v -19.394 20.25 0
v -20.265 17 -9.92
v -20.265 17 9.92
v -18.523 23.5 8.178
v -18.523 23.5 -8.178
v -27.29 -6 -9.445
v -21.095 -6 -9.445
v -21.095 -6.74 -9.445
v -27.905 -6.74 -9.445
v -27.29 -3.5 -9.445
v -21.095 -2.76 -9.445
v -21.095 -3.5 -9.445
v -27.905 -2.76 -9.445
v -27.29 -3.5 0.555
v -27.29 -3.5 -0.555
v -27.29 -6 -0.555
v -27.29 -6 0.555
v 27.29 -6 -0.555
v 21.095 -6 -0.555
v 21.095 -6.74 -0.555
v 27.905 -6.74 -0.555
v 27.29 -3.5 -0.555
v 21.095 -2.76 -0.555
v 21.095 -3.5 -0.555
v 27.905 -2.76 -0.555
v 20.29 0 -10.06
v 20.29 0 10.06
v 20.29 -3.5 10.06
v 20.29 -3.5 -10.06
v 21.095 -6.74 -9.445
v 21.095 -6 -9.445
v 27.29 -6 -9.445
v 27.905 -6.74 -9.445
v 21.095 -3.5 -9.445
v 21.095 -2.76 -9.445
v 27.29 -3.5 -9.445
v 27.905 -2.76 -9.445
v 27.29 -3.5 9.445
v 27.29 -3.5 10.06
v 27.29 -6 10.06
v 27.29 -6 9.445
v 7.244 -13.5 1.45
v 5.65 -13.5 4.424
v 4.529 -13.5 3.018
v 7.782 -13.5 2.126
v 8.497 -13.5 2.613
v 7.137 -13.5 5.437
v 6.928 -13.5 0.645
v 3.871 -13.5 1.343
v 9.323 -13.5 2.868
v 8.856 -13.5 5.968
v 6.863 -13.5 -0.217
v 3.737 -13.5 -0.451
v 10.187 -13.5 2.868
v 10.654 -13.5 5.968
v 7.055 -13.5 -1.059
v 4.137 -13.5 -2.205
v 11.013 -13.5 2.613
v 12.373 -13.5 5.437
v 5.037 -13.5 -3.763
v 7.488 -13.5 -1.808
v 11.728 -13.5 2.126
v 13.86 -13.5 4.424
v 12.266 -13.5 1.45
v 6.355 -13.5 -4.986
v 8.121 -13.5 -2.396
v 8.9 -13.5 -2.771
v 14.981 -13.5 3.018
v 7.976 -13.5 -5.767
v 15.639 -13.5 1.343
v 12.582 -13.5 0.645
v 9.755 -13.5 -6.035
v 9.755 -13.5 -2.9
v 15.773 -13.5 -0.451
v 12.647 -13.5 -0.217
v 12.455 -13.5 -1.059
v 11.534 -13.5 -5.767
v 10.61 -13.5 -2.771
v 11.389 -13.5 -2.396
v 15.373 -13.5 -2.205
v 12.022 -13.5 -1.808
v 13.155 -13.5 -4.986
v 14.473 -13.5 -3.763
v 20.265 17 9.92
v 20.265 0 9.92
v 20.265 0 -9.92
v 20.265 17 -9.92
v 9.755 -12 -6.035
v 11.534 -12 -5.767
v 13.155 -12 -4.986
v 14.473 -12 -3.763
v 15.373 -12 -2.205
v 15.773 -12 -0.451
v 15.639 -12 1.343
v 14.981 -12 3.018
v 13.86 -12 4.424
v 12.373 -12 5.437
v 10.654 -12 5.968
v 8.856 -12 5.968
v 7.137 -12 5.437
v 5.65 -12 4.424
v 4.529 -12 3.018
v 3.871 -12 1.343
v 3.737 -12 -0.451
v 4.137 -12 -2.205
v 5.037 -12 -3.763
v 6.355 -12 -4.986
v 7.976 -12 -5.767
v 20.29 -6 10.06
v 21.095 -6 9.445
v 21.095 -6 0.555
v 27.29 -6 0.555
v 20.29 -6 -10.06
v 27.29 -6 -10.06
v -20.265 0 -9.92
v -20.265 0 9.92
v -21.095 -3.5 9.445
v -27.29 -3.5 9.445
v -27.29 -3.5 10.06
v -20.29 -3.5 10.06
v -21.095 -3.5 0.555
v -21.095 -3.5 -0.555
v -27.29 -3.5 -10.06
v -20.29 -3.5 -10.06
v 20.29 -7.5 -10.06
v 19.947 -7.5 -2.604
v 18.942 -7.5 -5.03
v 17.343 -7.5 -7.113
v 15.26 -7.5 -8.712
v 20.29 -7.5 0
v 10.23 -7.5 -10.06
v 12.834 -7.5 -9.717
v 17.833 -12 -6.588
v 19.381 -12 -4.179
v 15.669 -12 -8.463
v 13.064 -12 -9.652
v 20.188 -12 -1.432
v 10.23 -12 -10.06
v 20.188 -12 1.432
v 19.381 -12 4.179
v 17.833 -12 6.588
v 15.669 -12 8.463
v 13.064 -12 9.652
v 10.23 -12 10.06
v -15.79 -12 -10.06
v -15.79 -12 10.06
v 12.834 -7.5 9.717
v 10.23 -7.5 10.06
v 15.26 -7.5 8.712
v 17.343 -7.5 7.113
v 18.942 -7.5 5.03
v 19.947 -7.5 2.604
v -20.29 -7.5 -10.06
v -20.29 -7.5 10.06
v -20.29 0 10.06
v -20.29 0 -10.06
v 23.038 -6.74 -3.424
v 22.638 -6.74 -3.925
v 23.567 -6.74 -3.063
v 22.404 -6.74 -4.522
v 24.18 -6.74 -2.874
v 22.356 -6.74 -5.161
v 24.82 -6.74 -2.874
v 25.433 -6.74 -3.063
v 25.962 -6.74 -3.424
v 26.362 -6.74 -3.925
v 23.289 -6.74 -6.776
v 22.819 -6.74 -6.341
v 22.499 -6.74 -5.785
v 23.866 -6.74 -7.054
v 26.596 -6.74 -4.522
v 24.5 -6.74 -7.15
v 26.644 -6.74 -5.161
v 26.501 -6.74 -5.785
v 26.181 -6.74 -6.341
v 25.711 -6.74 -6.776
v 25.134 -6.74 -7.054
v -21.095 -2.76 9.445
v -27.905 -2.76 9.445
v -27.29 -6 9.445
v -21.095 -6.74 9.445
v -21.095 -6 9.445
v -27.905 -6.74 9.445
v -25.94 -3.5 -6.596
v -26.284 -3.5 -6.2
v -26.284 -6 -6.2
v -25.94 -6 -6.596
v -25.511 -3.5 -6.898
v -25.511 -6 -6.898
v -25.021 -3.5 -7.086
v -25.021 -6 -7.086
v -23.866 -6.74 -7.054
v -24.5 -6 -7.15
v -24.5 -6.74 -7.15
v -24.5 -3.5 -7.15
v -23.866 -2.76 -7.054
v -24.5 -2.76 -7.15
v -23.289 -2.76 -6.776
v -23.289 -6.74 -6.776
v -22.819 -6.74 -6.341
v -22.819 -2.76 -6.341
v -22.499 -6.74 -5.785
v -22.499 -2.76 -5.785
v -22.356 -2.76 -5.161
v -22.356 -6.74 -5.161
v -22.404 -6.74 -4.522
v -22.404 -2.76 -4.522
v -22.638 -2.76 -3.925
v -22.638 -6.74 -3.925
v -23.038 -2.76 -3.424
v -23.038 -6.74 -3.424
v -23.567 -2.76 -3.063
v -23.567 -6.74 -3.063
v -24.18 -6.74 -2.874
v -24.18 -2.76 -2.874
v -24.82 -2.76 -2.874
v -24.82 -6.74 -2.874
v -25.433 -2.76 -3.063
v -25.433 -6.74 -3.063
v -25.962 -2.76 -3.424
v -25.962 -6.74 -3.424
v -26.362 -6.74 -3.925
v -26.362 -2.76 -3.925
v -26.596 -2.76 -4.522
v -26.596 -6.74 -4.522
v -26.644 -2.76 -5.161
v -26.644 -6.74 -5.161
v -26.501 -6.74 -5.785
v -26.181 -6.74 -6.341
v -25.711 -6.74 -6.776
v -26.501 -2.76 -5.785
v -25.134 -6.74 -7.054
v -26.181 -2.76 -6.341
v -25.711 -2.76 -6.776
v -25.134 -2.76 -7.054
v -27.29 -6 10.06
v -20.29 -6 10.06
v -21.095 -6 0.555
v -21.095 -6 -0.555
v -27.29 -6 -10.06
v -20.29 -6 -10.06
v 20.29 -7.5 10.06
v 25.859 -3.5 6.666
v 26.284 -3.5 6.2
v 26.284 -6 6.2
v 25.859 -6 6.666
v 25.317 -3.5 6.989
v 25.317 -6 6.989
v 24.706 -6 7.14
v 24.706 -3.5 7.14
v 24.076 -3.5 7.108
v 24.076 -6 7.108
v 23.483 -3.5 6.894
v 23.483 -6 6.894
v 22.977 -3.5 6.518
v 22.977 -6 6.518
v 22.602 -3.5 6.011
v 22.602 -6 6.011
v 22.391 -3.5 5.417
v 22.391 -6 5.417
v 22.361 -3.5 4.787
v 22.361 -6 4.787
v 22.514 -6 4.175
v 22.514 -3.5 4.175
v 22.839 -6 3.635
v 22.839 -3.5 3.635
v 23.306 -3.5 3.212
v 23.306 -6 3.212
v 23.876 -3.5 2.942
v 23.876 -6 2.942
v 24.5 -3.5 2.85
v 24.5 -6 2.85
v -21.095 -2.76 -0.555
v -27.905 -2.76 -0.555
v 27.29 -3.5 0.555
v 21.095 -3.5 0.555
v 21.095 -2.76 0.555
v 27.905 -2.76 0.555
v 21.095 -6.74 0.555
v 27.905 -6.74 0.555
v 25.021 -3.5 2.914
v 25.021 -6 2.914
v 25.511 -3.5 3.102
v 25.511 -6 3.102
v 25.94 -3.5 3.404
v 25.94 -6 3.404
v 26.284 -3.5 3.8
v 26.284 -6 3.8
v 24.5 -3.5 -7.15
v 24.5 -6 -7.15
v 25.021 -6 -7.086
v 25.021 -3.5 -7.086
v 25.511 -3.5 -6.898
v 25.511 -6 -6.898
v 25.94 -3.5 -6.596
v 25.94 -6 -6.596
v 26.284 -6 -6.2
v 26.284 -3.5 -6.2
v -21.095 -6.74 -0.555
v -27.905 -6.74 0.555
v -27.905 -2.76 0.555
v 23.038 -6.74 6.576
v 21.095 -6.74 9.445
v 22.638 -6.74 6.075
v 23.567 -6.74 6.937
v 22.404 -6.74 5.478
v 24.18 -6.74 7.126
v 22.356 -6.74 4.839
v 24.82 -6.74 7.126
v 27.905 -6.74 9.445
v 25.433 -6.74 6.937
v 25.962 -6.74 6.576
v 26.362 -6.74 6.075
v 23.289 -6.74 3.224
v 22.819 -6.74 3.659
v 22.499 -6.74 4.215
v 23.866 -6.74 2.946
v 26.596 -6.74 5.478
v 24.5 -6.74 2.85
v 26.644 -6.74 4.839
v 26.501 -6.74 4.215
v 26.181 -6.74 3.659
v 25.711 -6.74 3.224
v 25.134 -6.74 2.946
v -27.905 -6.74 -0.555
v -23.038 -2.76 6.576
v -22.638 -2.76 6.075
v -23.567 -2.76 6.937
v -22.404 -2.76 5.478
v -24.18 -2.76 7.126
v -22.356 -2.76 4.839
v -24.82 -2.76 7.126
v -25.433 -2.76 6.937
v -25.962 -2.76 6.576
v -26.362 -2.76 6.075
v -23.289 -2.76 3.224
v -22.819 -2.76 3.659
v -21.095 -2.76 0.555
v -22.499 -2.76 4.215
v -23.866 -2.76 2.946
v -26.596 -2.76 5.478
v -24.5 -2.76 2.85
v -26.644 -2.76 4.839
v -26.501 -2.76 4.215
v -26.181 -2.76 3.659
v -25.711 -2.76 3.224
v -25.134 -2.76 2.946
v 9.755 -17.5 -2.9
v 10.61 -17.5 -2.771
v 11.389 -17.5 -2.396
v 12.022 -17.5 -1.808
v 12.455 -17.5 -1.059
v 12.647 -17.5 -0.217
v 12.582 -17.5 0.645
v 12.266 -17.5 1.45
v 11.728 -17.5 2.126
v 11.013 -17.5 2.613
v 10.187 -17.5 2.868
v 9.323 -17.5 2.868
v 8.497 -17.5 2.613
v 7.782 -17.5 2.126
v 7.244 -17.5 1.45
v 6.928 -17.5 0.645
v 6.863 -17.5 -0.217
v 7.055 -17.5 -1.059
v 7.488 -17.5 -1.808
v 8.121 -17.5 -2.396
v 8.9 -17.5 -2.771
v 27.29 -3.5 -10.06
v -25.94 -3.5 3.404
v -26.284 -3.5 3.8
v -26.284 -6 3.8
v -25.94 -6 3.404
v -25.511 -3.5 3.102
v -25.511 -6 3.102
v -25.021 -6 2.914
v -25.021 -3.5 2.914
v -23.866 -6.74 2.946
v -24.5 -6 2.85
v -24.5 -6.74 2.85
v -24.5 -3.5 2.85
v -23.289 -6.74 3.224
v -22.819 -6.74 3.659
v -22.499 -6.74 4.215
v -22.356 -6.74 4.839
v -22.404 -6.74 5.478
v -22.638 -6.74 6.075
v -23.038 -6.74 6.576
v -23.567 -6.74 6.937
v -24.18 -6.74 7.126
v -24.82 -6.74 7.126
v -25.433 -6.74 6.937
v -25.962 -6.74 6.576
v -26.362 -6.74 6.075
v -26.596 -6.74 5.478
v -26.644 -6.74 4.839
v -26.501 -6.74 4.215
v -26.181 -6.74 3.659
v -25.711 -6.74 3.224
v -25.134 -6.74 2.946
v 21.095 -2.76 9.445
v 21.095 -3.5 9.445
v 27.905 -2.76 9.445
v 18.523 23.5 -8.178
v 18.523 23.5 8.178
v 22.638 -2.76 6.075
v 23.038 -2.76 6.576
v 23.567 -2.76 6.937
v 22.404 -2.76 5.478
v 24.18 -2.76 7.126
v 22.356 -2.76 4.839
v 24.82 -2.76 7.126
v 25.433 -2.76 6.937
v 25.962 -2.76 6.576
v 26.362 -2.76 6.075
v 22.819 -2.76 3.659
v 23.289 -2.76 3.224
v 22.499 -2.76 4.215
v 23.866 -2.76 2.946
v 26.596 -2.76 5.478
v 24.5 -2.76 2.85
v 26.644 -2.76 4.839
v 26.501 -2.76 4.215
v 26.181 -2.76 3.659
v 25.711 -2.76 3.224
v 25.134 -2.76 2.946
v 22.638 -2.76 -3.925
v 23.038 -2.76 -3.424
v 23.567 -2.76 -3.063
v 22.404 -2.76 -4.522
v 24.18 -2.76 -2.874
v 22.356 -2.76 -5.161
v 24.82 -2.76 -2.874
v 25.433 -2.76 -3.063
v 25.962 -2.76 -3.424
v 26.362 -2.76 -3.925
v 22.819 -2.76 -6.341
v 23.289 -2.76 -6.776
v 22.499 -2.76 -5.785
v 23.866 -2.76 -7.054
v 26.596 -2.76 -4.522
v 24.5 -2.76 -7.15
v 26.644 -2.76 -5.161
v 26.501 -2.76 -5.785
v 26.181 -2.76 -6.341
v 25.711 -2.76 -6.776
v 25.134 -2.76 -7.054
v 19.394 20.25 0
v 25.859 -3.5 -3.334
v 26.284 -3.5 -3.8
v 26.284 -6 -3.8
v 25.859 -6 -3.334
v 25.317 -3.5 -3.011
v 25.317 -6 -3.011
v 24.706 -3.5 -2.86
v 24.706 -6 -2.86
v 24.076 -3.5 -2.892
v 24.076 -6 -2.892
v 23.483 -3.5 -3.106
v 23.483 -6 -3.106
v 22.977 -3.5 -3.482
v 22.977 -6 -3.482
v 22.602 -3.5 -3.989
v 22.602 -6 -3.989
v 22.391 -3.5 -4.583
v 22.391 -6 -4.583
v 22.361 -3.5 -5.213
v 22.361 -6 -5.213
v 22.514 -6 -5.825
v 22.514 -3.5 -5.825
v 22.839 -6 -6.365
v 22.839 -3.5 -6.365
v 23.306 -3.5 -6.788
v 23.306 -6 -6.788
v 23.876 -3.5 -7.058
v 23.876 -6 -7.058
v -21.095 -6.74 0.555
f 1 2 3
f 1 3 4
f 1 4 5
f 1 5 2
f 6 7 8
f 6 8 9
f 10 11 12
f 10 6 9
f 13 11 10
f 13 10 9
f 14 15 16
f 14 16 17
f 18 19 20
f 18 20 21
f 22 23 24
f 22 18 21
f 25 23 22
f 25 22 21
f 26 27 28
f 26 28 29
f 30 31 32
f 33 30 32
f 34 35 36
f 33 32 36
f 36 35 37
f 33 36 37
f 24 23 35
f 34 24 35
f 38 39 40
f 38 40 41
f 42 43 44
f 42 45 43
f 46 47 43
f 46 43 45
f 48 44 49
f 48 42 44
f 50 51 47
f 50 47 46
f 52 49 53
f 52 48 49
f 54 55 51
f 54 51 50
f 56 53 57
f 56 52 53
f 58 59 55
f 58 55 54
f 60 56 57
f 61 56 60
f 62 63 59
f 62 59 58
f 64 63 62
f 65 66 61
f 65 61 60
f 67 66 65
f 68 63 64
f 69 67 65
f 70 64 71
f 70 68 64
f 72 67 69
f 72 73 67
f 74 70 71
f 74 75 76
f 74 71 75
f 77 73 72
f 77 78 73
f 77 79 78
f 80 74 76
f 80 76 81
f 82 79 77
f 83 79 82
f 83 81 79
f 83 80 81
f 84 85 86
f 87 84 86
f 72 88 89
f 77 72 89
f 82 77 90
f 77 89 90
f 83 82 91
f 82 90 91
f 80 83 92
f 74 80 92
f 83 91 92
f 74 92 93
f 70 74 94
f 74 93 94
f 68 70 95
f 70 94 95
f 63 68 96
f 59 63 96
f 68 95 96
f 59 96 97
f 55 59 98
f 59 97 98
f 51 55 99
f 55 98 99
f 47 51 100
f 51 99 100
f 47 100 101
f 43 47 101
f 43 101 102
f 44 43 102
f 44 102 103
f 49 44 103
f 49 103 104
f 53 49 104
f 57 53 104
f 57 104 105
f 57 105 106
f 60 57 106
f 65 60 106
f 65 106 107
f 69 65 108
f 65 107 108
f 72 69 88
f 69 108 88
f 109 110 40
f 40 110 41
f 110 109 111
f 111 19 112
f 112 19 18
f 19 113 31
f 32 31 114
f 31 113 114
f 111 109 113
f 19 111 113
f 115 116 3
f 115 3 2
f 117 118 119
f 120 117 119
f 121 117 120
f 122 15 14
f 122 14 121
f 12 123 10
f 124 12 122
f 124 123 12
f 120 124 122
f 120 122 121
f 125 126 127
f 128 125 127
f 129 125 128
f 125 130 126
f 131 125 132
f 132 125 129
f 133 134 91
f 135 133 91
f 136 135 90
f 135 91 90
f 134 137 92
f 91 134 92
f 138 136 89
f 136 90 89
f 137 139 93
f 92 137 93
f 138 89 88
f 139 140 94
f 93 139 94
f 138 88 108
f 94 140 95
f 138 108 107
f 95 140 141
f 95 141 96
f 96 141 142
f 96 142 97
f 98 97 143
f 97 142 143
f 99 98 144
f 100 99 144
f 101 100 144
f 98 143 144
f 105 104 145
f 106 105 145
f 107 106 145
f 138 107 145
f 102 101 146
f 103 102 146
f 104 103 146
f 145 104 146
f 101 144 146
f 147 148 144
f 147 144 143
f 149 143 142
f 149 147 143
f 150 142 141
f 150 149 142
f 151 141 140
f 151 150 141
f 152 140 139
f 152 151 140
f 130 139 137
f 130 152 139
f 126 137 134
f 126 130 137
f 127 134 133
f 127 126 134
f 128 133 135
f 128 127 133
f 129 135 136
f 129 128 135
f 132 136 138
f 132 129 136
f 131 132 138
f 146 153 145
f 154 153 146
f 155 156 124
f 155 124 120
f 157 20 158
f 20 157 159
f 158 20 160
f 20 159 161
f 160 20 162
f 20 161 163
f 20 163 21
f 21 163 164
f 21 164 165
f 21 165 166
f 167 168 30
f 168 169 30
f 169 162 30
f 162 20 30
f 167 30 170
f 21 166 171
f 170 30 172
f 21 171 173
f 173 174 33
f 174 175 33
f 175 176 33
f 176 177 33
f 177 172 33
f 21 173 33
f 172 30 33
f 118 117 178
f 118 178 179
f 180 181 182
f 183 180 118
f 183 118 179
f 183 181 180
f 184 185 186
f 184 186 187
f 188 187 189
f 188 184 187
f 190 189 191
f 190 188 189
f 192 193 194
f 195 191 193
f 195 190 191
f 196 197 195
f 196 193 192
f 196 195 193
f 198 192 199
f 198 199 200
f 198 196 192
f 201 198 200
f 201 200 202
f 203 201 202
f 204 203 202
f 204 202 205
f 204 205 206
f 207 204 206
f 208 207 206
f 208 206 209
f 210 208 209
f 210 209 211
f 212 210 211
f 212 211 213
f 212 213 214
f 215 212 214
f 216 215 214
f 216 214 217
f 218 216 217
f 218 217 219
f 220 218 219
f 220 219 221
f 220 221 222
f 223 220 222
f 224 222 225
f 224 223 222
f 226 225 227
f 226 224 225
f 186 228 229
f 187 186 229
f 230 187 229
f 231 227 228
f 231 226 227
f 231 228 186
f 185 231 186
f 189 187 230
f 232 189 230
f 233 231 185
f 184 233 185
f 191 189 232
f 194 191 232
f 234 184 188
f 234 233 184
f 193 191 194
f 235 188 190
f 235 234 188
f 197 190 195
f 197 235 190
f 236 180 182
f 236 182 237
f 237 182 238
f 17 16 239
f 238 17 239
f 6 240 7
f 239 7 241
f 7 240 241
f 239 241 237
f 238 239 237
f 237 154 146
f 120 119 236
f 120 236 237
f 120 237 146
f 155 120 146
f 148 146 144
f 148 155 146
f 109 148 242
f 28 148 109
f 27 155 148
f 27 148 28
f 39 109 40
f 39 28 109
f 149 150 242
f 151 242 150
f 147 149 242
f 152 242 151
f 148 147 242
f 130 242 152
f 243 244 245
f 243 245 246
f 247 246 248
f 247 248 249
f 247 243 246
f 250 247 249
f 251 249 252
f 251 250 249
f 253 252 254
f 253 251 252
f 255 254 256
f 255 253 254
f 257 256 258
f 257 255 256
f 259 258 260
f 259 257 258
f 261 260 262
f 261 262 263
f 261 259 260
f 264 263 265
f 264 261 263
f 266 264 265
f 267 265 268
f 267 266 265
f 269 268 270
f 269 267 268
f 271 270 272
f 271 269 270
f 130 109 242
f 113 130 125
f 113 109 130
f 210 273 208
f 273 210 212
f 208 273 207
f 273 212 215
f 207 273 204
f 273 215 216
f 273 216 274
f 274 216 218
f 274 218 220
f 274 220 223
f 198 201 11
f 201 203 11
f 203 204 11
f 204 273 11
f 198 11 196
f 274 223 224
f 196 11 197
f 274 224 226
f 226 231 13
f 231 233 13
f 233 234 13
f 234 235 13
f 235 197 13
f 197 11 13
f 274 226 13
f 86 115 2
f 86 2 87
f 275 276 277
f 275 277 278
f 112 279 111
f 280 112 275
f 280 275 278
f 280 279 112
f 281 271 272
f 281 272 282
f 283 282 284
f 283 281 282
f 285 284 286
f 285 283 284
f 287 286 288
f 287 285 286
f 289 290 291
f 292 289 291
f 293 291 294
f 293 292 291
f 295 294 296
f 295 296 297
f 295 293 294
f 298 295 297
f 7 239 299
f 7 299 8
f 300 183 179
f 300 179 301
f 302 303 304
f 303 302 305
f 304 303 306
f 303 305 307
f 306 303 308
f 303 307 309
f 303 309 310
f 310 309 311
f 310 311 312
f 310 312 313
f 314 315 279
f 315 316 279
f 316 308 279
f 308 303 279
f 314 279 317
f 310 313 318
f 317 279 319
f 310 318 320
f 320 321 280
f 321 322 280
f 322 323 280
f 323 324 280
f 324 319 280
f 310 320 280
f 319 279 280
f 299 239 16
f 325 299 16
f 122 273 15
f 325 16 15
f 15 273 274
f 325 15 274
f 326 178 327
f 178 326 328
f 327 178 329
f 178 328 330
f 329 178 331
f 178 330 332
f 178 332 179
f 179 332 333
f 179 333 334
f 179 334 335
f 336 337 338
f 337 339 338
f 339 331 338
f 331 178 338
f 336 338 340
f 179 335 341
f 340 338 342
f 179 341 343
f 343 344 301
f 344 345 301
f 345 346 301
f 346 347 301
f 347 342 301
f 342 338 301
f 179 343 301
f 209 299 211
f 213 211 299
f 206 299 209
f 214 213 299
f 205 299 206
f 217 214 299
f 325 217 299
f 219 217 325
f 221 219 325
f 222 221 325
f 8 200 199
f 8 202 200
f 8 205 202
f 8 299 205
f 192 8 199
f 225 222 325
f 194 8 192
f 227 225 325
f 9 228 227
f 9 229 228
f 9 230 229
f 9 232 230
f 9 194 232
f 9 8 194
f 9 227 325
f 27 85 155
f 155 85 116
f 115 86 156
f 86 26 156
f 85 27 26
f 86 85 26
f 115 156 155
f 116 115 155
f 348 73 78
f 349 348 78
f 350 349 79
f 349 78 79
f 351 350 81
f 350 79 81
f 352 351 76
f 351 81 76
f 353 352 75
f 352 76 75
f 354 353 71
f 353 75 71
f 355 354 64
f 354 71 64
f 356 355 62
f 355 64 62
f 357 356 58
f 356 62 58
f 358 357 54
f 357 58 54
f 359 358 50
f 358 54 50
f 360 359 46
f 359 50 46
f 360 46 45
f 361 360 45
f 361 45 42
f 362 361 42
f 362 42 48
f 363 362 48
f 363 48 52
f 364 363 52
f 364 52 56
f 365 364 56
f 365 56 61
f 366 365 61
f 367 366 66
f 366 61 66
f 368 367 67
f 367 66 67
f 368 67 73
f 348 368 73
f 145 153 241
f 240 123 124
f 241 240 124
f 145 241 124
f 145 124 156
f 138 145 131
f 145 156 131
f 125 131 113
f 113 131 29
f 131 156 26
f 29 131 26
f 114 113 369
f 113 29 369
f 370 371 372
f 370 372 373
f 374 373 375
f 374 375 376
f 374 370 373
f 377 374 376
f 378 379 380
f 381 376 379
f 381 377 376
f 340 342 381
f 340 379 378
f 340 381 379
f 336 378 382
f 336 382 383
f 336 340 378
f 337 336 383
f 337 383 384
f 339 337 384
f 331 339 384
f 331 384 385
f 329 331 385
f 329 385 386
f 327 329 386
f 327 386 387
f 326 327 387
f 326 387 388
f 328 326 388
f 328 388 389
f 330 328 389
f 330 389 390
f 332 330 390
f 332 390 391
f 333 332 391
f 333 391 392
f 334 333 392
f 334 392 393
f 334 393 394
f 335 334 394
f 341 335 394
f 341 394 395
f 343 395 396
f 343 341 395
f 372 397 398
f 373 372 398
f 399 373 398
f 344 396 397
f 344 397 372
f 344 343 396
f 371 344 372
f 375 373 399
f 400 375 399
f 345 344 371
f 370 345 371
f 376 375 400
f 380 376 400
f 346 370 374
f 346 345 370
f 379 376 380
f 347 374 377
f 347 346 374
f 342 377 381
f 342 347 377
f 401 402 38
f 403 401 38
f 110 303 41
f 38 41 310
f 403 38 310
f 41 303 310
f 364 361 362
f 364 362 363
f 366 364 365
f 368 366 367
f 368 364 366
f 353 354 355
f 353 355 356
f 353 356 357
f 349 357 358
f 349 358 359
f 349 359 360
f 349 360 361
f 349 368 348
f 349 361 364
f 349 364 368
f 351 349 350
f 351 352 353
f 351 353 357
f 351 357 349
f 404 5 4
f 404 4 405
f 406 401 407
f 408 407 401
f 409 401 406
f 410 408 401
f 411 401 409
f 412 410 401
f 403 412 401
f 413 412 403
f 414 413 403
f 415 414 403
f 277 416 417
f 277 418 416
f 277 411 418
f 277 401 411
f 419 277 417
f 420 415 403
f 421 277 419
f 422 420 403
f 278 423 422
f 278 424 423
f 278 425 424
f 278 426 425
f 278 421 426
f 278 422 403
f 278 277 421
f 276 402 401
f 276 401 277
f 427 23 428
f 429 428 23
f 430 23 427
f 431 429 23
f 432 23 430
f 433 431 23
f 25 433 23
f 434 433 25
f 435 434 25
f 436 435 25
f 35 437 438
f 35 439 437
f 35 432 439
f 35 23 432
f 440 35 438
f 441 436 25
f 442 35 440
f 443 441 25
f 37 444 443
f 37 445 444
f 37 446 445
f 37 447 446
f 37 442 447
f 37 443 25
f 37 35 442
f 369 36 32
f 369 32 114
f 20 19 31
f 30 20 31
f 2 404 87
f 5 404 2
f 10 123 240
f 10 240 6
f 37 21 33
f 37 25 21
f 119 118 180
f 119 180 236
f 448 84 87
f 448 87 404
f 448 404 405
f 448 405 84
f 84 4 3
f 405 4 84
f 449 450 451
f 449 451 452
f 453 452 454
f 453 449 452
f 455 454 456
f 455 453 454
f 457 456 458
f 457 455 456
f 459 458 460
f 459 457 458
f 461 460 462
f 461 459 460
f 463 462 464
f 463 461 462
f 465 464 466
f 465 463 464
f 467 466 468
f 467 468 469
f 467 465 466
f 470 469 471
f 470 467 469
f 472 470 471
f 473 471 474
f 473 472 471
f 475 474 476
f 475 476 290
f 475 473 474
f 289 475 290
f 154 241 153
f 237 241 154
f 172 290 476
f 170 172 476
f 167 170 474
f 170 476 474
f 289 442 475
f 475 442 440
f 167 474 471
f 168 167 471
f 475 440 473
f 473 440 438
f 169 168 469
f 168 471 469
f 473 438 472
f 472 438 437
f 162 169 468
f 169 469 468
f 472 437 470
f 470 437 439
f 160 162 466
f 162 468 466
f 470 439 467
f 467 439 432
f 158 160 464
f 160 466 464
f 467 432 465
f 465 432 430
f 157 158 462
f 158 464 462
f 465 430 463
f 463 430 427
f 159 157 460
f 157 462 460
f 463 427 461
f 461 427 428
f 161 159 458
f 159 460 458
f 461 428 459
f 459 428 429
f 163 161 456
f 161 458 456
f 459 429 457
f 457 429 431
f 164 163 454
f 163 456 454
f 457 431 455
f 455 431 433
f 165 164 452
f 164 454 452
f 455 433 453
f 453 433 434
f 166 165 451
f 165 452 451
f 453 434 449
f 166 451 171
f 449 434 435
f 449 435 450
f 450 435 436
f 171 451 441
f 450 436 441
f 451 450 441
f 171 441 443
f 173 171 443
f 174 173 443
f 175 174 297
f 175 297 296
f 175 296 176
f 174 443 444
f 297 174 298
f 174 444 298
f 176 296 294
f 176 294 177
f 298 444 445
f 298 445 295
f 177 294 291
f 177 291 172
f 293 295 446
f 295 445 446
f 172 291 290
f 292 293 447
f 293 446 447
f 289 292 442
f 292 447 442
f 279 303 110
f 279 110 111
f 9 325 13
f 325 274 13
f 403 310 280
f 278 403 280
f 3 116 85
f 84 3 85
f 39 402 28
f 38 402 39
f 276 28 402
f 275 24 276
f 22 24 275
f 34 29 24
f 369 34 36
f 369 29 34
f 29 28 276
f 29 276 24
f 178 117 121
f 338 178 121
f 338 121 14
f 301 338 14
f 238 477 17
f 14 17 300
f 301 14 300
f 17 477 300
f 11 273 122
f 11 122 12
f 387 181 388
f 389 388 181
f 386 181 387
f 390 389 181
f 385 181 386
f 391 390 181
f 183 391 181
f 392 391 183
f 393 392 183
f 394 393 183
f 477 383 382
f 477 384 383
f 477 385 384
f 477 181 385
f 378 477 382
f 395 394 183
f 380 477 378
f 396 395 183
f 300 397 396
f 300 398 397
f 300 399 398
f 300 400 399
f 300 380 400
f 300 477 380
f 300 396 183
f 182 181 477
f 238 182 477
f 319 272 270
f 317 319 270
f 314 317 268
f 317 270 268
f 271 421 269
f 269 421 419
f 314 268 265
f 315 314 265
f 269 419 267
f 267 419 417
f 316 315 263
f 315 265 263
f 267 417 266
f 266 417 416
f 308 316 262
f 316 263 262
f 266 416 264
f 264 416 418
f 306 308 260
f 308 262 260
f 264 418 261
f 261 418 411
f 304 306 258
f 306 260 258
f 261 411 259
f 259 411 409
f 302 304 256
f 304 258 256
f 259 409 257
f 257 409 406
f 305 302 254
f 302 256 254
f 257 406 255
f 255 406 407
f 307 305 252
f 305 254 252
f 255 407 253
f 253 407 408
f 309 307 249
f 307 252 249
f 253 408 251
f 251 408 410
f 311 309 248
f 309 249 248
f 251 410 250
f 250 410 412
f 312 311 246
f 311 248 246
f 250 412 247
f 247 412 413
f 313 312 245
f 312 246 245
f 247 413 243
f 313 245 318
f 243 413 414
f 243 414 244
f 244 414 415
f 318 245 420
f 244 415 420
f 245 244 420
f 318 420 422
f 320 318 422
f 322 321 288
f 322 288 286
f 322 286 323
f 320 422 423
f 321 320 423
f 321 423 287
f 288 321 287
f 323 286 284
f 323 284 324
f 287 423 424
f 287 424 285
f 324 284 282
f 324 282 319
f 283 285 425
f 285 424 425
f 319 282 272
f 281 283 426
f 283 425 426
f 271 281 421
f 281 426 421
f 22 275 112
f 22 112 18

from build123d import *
from build123d.topology import SkipClean

# Parameters (mm, degrees)
SCHIZZO1_W                   = 40.53
SCHIZZO1_H                   = 19.84
ESTRUSIONE_ESTRUSIONE1_DEPTH = 17
SCHIZZO2_W                   = 40.53
SCHIZZO2_H                   = 19.84
ESTRUSIONE_ESTRUSIONE2_DEPTH = 6.5
ESTRUSIONE_ESTRUSIONE2_TAPER = 15
SCHIZZO3_W                   = 40.58
SCHIZZO3_H                   = 20.12
ESTRUSIONE_ESTRUSIONE3_DEPTH = 7.5
SCHIZZO5_W                   = 30.52
SCHIZZO5_H                   = 20.12
ESTRUSIONE_ESTRUSIONE4_DEPTH = 4.5
SCHIZZO6_R                   = 6.035
ESTRUSIONE_ESTRUSIONE5_DEPTH = 1.5
SCHIZZO7_R                   = 2.9
ESTRUSIONE_ESTRUSIONE6_DEPTH = 4
SMUSSO1_SIZE                 = 4.5
ESTRUSIONE_ESTRUSIONE7_DEPTH = 2.5
SCHIZZO11_W                  = 6.81
SCHIZZO11_H                  = 8.89
SCHIZZO11_R                  = 2.15
ESTRUSIONE_ESTRUSIONE8_DEPTH = 1.99


with BuildPart() as part:
    # Schizzo1 → Estrusione-Estrusione1 (new body)
    with BuildSketch(Plane(origin=(0, 0, 0), x_dir=(1, 0, 0), z_dir=(0, 1, 0))):
        Rectangle(SCHIZZO1_W, SCHIZZO1_H)
    extrude(amount=ESTRUSIONE_ESTRUSIONE1_DEPTH)

    # Schizzo2 → Estrusione-Estrusione2 (add)
    with BuildSketch(Plane(origin=(0, 17, 0), x_dir=(1, 0, 0), z_dir=(0, 1, 0))):
        Rectangle(SCHIZZO2_W, SCHIZZO2_H)
    extrude(amount=ESTRUSIONE_ESTRUSIONE2_DEPTH, taper=ESTRUSIONE_ESTRUSIONE2_TAPER)

    # Schizzo3 → Estrusione-Estrusione3 (add)
    with BuildSketch(Plane(origin=(0, 0, 0), x_dir=(-1, 0, 0), z_dir=(0, -1, 0))):
        Rectangle(SCHIZZO3_W, SCHIZZO3_H)
    extrude(amount=ESTRUSIONE_ESTRUSIONE3_DEPTH)

    # Schizzo5 → Estrusione-Estrusione4 (add)
    with BuildSketch(Plane.XZ.offset(7.5)):
        with BuildLine():
            Line((10.23, -10.06), (10.23, 10.06))
            ThreePointArc((10.23, 10.06), (20.29, 0), (10.23, -10.06))
        make_face()
        with Locations((-5.03, 0)):
            Rectangle(SCHIZZO5_W, SCHIZZO5_H)
    extrude(amount=ESTRUSIONE_ESTRUSIONE4_DEPTH)

    # Schizzo6 → Estrusione-Estrusione5 (add)
    with BuildSketch(Plane.XZ.offset(12)):
        with Locations(Location((9.755, 0, 0), (0, 0, 270))):
            Circle(SCHIZZO6_R)
    extrude(amount=ESTRUSIONE_ESTRUSIONE5_DEPTH)

    # Schizzo7 → Estrusione-Estrusione6 (add)
    with BuildSketch(Plane.XZ.offset(13.5)):
        with Locations(Location((9.755, 0, 0), (0, 0, 270))):
            Circle(SCHIZZO7_R)
    extrude(amount=ESTRUSIONE_ESTRUSIONE6_DEPTH)

    # Smusso1
    smusso1_edges = [part.edges().sort_by_distance(p)[0] for p in [
        (-20.29, -12, 0),
    ]]
    chamfer(smusso1_edges, length=SMUSSO1_SIZE)

    # Schizzo8 → Estrusione-Estrusione7 (add)
    with BuildSketch(Plane(origin=(0, -3.5, 0), x_dir=(1, 0, 0), z_dir=(0, 1, 0))):
        with BuildLine():
            Line((-27.29, -10.06), (-20.29, -10.06))
            Line((-20.29, -10.06), (-20.29, 10.06))
            Line((-20.29, 10.06), (-27.29, 10.06))
            Line((-27.29, 10.06), (-27.29, 6.2))
            Line((-27.29, 6.2), (-26.283956277, 6.2))
            ThreePointArc((-26.283956277, 6.2), (-23.872706606, 7.056453986), (-22.35, 5))
            ThreePointArc((-22.35, 5), (-23.872706606, 2.943546014), (-26.283956277, 3.8))
            Line((-26.283956277, 3.8), (-27.29, 3.8))
            Line((-27.29, 3.8), (-27.29, -3.8))
            Line((-27.29, -3.8), (-26.283956277, -3.8))
            ThreePointArc((-26.283956277, -3.8), (-23.872706606, -2.943546014), (-22.35, -5))
            ThreePointArc((-22.35, -5), (-23.872706606, -7.056453986), (-26.283956277, -6.2))
            Line((-26.283956277, -6.2), (-27.29, -6.2))
            Line((-27.29, -6.2), (-27.29, -10.06))
        make_face()
        with BuildLine():
            Line((20.29, -10.06), (27.29, -10.06))
            Line((27.29, -10.06), (27.29, -6.2))
            Line((27.29, -6.2), (26.283956277, -6.2))
            ThreePointArc((26.283956277, -6.2), (22.35, -5), (26.283956277, -3.8))
            Line((26.283956277, -3.8), (27.29, -3.8))
            Line((27.29, -3.8), (27.29, 3.8))
            Line((27.29, 3.8), (26.283956277, 3.8))
            ThreePointArc((26.283956277, 3.8), (22.35, 5), (26.283956277, 6.2))
            Line((26.283956277, 6.2), (27.29, 6.2))
            Line((27.29, 6.2), (27.29, 10.06))
            Line((27.29, 10.06), (20.29, 10.06))
            Line((20.29, 10.06), (20.29, -10.06))
        make_face()
    extrude(amount=-ESTRUSIONE_ESTRUSIONE7_DEPTH)

    # Schizzo11 → Estrusione-Estrusione8 (add, symmetric)
    # profile 1 of 2: a face of its own
    with BuildSketch(Plane(origin=(0, -4.75, 0), x_dir=(-1, 0, 0), z_dir=(0, -1, 0))):
        with Locations((24.5, 5)):
            Rectangle(SCHIZZO11_W, SCHIZZO11_H)
        with Locations(Location((24.5, 5, 0), (0, 0, 90))):
            Circle(SCHIZZO11_R, mode=Mode.SUBTRACT)
    # profile 2 of 2: a face of its own
    with BuildSketch(Plane(origin=(0, -4.75, 0), x_dir=(-1, 0, 0), z_dir=(0, -1, 0))):
        with Locations((24.5, -5)):
            Rectangle(SCHIZZO11_W, SCHIZZO11_H)
        with Locations(Location((24.5, -5, 0), (0, 0, 90))):
            Circle(SCHIZZO11_R, mode=Mode.SUBTRACT)
    estrusione_estrusione8 = extrude(amount=ESTRUSIONE_ESTRUSIONE8_DEPTH, both=True)

    # Specchia1: Estrusione-Estrusione8 across plane
    with SkipClean():  # the faces are left unmerged after this step: merging them gives an invalid solid
        add(estrusione_estrusione8.mirror(Plane(origin=(0, 0, 0), x_dir=(0, 0, 1), z_dir=(1, 0, 0))))


solid = part.part
